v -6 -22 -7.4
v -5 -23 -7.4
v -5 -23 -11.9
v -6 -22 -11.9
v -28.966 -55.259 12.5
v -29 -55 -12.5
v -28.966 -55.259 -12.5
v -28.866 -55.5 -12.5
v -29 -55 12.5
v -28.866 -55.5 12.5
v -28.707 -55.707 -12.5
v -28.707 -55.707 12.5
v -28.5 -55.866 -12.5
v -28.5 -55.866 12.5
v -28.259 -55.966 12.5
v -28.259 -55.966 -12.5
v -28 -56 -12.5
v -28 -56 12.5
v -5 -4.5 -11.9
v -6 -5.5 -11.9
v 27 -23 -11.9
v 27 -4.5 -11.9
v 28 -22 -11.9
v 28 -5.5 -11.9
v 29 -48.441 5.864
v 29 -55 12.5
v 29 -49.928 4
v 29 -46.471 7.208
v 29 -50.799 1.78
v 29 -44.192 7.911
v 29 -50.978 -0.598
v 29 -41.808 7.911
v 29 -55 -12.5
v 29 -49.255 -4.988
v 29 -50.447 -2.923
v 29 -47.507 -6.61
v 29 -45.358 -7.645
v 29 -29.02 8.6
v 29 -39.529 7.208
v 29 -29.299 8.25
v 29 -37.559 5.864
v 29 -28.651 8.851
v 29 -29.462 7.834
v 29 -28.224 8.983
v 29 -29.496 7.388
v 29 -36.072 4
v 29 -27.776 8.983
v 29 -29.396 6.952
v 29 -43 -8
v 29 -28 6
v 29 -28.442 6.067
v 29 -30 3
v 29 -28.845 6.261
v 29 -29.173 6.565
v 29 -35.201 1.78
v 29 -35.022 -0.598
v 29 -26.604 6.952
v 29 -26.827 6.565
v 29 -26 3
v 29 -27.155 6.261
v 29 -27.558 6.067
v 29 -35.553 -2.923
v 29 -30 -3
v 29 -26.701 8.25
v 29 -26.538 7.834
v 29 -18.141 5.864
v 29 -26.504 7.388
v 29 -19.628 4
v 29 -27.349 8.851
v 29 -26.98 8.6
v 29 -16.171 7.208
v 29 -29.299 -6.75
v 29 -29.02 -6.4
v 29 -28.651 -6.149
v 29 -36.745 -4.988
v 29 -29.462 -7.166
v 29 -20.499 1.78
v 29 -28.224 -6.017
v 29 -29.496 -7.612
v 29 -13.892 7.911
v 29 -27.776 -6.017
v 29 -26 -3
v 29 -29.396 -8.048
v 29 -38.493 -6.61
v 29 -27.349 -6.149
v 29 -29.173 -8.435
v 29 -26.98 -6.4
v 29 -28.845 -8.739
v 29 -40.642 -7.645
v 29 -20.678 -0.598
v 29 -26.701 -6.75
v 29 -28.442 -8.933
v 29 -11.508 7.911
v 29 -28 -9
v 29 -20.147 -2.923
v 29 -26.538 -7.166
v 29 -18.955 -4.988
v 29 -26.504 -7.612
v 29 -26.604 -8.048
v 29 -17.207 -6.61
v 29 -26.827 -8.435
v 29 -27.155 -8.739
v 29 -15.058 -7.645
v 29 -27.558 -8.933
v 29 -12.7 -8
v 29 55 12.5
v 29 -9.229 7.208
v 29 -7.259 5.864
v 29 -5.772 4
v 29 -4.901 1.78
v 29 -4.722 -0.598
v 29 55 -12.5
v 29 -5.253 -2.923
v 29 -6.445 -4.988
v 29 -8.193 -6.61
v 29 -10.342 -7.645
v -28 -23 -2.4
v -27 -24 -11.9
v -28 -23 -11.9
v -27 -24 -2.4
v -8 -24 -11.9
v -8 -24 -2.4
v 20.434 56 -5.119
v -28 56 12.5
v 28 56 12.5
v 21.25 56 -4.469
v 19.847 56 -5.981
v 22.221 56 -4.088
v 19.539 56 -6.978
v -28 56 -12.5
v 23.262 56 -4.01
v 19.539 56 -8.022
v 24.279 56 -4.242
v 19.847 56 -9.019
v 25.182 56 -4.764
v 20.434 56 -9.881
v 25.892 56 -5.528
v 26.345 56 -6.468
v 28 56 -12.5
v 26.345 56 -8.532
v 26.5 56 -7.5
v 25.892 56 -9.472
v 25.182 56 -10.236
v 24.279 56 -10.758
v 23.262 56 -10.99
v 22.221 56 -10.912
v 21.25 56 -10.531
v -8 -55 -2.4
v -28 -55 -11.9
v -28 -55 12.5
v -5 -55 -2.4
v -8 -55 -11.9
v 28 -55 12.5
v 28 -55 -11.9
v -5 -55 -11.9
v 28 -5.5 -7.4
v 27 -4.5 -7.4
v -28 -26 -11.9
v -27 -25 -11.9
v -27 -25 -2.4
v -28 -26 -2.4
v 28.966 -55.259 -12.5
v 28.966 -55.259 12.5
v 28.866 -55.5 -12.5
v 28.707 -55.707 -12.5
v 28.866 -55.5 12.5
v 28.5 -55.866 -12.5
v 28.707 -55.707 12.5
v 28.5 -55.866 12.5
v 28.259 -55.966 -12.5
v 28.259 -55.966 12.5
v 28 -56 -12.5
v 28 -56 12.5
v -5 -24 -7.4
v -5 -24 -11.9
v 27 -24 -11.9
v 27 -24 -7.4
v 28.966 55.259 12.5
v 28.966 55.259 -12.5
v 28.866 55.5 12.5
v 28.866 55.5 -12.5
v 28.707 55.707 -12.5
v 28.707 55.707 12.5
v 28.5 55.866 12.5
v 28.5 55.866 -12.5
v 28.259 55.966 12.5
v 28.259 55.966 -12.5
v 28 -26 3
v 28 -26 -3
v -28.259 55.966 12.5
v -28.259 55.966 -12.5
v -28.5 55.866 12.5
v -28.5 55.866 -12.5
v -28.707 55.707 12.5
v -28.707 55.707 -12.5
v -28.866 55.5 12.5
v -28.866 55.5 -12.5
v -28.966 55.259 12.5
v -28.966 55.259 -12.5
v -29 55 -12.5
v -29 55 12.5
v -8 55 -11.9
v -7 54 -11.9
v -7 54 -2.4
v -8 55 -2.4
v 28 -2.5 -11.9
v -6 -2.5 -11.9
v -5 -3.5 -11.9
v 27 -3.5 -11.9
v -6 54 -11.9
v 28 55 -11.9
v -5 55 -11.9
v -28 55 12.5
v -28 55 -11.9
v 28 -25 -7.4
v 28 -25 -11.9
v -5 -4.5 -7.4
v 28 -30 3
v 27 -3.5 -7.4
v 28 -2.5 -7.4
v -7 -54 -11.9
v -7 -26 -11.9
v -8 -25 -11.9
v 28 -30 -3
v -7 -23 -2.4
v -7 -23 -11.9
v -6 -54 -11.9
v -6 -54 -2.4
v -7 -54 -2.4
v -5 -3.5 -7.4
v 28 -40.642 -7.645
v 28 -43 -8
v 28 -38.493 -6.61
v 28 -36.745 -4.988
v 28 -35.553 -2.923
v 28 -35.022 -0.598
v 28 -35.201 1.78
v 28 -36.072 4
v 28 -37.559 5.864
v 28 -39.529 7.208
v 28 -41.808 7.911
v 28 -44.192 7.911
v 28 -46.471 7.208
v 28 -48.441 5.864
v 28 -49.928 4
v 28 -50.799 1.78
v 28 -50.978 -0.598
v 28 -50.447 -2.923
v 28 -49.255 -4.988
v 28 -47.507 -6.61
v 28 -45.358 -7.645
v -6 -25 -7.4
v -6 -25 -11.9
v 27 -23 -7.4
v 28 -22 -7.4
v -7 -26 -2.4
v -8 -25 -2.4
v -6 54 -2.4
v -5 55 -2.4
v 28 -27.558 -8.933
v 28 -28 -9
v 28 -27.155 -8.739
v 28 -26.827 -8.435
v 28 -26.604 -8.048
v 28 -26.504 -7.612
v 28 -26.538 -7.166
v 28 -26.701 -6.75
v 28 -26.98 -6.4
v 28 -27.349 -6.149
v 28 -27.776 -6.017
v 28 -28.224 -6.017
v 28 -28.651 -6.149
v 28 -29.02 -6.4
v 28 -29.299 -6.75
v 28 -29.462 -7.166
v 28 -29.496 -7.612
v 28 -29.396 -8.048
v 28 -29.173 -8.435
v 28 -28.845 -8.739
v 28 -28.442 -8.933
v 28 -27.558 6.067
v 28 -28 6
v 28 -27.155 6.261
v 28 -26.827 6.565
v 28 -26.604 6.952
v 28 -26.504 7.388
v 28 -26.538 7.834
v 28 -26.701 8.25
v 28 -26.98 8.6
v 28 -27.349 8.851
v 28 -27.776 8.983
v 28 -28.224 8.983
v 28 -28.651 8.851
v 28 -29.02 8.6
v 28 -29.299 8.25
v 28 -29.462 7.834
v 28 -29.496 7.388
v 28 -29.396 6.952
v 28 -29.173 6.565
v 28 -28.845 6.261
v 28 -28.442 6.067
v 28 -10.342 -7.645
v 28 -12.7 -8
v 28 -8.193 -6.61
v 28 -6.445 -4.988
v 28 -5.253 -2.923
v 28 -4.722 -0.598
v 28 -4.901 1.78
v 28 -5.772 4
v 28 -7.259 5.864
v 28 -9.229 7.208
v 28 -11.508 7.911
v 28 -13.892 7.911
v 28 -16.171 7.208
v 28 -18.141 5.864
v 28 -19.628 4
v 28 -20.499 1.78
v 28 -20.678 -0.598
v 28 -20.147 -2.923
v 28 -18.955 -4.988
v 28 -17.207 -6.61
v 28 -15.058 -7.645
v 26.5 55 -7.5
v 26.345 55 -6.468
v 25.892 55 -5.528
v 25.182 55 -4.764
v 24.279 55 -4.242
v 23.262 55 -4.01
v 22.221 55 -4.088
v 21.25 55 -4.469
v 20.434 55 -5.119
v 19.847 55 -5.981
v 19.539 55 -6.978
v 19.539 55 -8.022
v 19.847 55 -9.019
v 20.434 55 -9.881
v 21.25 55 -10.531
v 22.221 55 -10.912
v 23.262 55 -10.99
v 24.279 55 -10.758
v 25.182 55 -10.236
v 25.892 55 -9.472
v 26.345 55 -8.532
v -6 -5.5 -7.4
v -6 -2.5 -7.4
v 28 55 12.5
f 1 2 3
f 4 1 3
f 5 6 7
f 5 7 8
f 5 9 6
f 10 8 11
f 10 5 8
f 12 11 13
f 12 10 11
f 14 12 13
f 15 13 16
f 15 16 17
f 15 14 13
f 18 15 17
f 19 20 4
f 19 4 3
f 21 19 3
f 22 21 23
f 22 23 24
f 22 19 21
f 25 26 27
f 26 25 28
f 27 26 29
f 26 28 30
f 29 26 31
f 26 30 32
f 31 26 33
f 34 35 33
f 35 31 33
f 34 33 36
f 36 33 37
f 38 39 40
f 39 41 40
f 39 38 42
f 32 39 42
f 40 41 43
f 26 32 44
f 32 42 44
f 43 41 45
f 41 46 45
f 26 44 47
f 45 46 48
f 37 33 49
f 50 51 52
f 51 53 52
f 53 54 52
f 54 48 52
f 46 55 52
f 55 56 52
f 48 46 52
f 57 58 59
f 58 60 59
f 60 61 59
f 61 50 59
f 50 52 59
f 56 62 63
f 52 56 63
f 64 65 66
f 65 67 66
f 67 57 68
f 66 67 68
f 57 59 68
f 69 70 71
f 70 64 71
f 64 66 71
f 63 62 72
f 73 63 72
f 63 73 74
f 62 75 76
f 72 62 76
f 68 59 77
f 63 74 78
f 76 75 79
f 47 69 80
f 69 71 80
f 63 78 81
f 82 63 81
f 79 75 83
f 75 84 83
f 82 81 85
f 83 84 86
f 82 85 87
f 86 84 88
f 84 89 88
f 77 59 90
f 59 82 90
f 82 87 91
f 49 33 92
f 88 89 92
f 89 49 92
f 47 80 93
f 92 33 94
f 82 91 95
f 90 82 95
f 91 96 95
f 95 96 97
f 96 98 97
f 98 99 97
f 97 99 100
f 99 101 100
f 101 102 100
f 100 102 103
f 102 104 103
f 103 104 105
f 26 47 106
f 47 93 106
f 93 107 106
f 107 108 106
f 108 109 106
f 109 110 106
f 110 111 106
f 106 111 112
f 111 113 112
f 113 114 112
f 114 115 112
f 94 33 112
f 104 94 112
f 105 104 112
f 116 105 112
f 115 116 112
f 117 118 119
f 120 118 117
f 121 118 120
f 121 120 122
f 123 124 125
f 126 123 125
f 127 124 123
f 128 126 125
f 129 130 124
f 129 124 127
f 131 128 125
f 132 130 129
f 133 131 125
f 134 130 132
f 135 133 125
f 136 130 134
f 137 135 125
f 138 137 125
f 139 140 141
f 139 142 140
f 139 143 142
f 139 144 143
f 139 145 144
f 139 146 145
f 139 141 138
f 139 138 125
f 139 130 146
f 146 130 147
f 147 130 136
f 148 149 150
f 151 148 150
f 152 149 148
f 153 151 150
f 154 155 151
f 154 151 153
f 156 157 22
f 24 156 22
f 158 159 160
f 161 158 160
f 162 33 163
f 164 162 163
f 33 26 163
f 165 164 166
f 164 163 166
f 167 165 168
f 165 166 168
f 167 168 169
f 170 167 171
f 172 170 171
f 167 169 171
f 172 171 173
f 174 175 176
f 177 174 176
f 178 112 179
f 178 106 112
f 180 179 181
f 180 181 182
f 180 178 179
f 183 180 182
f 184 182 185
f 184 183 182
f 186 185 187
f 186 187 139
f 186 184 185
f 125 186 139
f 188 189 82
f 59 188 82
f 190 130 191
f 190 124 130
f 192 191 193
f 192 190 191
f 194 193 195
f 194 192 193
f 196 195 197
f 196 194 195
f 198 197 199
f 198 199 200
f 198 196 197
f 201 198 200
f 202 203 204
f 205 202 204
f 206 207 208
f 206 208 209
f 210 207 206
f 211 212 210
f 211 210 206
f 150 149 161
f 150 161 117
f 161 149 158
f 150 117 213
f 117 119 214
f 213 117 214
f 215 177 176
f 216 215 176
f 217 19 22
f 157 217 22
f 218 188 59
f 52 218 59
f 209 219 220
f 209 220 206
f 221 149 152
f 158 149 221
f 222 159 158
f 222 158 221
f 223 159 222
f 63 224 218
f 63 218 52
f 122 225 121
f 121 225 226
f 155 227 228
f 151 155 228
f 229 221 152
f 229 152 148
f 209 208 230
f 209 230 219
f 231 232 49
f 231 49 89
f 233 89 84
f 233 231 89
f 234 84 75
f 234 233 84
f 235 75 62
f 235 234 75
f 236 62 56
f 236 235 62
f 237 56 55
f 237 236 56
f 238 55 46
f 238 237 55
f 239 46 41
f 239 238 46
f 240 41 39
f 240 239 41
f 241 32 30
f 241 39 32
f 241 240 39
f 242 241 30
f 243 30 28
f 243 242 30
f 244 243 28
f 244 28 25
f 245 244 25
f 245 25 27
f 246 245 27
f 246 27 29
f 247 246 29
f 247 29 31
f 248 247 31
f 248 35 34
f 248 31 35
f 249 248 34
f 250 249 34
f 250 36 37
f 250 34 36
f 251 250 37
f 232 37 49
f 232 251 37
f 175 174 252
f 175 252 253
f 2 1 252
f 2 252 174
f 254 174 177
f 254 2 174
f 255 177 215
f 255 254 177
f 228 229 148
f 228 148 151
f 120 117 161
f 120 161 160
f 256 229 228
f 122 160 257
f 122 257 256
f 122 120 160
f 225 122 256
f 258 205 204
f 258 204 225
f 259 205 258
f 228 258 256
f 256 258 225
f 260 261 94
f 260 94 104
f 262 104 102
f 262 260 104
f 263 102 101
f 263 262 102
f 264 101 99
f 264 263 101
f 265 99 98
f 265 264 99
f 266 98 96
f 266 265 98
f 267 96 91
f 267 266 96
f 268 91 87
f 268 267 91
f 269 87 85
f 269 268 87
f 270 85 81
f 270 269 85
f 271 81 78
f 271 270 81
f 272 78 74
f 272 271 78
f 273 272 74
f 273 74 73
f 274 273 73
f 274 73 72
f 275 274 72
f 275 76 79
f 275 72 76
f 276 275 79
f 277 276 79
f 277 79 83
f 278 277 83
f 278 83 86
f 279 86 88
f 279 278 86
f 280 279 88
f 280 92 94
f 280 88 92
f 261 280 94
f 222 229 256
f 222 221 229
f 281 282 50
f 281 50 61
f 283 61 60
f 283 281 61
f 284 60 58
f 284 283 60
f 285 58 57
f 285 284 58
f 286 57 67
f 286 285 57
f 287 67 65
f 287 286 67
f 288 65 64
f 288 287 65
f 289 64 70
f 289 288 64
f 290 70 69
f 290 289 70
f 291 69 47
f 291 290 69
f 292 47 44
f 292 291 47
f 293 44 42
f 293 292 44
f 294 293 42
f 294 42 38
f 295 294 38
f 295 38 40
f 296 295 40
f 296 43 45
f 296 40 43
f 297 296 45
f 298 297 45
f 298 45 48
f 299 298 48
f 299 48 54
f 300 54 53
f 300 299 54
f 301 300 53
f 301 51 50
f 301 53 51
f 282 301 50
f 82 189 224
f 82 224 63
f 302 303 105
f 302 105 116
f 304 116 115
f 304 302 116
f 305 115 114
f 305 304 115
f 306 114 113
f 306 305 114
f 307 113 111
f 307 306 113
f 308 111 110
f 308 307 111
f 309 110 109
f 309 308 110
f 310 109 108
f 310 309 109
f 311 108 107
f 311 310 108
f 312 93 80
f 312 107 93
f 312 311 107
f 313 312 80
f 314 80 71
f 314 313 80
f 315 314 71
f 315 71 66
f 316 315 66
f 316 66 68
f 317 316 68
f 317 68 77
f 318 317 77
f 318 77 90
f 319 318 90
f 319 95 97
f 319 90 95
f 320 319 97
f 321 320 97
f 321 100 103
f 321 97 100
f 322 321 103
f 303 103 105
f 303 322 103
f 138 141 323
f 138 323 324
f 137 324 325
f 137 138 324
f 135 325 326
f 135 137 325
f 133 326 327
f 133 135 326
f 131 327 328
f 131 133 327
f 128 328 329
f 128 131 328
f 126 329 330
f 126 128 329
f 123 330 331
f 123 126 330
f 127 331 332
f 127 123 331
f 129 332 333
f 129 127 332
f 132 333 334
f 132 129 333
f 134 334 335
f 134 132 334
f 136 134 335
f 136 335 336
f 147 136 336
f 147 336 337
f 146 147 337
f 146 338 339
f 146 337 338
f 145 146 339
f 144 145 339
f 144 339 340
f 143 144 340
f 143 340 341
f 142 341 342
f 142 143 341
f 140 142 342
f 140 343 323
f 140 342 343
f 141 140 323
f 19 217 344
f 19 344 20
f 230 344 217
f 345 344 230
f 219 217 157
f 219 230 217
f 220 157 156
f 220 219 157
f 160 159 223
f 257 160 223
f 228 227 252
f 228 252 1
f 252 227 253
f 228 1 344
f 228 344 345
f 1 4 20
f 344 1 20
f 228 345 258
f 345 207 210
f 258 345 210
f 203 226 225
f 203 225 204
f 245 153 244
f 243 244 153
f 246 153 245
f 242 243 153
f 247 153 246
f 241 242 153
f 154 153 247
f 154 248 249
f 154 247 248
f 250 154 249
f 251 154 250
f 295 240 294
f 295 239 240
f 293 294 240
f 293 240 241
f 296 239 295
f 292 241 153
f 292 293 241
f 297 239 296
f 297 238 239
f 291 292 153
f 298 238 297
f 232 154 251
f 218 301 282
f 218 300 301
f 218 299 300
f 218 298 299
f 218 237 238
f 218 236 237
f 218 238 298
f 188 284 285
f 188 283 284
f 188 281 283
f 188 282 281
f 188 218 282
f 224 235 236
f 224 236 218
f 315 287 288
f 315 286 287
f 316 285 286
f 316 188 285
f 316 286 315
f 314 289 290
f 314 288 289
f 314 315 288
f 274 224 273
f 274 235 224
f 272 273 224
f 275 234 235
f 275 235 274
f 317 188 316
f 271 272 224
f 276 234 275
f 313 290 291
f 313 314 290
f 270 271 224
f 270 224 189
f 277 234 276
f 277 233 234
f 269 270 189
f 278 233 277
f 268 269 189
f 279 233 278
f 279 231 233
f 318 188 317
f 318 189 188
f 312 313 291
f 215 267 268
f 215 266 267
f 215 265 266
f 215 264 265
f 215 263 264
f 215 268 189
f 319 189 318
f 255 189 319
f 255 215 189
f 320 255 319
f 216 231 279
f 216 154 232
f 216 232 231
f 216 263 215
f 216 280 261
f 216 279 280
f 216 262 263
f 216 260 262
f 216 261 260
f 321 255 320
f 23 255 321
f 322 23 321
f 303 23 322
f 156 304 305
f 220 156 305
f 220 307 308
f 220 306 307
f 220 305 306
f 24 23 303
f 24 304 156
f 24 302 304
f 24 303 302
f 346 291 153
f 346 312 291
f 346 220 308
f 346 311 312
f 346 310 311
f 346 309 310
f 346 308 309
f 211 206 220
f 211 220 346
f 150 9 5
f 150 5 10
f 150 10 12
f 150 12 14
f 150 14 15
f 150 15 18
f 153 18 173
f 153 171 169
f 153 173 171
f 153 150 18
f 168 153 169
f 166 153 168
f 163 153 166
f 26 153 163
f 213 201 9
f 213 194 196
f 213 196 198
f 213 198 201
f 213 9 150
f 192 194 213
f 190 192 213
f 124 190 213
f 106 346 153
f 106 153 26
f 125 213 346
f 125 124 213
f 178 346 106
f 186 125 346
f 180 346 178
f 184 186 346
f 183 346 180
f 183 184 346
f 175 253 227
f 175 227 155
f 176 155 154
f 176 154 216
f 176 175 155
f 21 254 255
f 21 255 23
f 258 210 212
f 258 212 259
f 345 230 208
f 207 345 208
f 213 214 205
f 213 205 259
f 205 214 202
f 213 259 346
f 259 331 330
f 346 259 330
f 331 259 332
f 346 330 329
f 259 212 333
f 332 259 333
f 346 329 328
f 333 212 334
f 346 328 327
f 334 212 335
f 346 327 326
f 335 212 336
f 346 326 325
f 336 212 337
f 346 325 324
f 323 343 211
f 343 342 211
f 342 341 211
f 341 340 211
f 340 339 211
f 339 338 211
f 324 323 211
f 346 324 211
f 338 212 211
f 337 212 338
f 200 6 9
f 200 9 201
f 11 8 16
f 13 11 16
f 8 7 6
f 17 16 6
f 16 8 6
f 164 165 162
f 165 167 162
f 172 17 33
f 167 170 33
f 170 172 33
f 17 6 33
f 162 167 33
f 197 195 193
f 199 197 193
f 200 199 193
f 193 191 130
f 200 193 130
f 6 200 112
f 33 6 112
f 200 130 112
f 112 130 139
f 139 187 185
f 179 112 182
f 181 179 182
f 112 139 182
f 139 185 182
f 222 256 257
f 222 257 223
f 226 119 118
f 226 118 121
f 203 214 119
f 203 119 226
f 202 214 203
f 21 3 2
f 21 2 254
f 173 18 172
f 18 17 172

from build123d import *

# Parameters (mm, degrees)
CYLINDER005_R           = 1.5
CYLINDER005_DEPTH       = 20
CYLINDER005_PITCH_ANGLE = 90
BOX005_W                = 10
BOX005_H                = 4
BOX005_DEPTH            = 6
CYLINDER002_R           = 8
CYLINDER002_DEPTH       = 6
CYLINDER002_PITCH_ANGLE = 90
CYLINDER001_R           = 8
CYLINDER001_DEPTH       = 6
CYLINDER001_PITCH_ANGLE = 90
CYLINDER_R              = 3.5
CYLINDER_DEPTH          = 50
CYLINDER_ROLL_ANGLE     = 90
CYLINDER006_R           = 1.5
CYLINDER006_DEPTH       = 20
CYLINDER006_PITCH_ANGLE = 90
BOX003_W                = 35.5
BOX003_H                = 1
BOX003_DEPTH            = 5
BOX004_W                = 35.5
BOX004_H                = 1
BOX004_DEPTH            = 5
BOX006_W                = 22
BOX006_H                = 1
BOX006_DEPTH            = 10
BOX002_W                = 1
BOX002_H                = 112
BOX002_DEPTH            = 10
BOX_W                   = 56
BOX_H                   = 110
BOX_DEPTH               = 25
BOX001_W                = 58
BOX001_H                = 112
BOX001_DEPTH            = 25
CHAMFER_SIZE            = 1
FILLET_R                = 1


with BuildPart() as cylinder005:
    # Cylinder005 → Cylinder005 (new body)
    with BuildSketch(Plane.XY):
        Circle(CYLINDER005_R)
    extrude(amount=CYLINDER005_DEPTH)


with BuildPart() as cylinder005_1:
    # Cylinder005 pitch: moved
    add(cylinder005.part.rotate(Axis((0, 0, 0), (0, 1, 0)), CYLINDER005_PITCH_ANGLE))


with BuildPart() as cylinder005_2:
    # Cylinder005 placement: moved
    add(cylinder005_1.part.moved(Location((19.5, -28, -7.5))))


with BuildPart() as interruptor:
    # Box005 → Box005 (new body)
    with BuildSketch(Plane(origin=(24, -30, -3), x_dir=(1, 0, 0), z_dir=(0, 0, 1))):
        with Locations((5, 2)):
            Rectangle(BOX005_W, BOX005_H)
    extrude(amount=BOX005_DEPTH)


with BuildPart() as boton2:
    # Cylinder002 → Cylinder002 (new body)
    with BuildSketch(Plane.XY):
        Circle(CYLINDER002_R)
    extrude(amount=CYLINDER002_DEPTH)


with BuildPart() as boton2_1:
    # Cylinder002 pitch: moved
    add(boton2.part.rotate(Axis((0, 0, 0), (0, 1, 0)), CYLINDER002_PITCH_ANGLE))


with BuildPart() as boton2_2:
    # Cylinder002 placement: moved
    add(boton2_1.part.moved(Location((25.5, -43, 0))))


with BuildPart() as boton1:
    # Cylinder001 → Cylinder001 (new body)
    with BuildSketch(Plane.XY):
        Circle(CYLINDER001_R)
    extrude(amount=CYLINDER001_DEPTH)


with BuildPart() as boton1_1:
    # Cylinder001 pitch: moved
    add(boton1.part.rotate(Axis((0, 0, 0), (0, 1, 0)), CYLINDER001_PITCH_ANGLE))


with BuildPart() as boton1_2:
    # Cylinder001 placement: moved
    add(boton1_1.part.moved(Location((25.5, -12.7, 0))))


with BuildPart() as antenna_hole:
    # Cylinder → Cylinder (new body)
    with BuildSketch(Plane.XY):
        Circle(CYLINDER_R)
    extrude(amount=CYLINDER_DEPTH)


with BuildPart() as antenna_hole_1:
    # Cylinder roll: moved
    add(antenna_hole.part.rotate(Axis((0, 0, 0), (1, 0, 0)), CYLINDER_ROLL_ANGLE))


with BuildPart() as antenna_hole_2:
    # Cylinder placement: moved
    add(antenna_hole_1.part.moved(Location((23, 86.9, -7.5))))


with BuildPart() as cortes:
    # Cylinder006 → Cylinder006 (new body)
    with BuildSketch(Plane.XY):
        Circle(CYLINDER006_R)
    extrude(amount=CYLINDER006_DEPTH)


with BuildPart() as cortes_1:
    # Cylinder006 pitch: moved
    add(cortes.part.rotate(Axis((0, 0, 0), (0, 1, 0)), CYLINDER006_PITCH_ANGLE))


with BuildPart() as cortes_2:
    # Cylinder006 placement: moved
    add(cortes_1.part.moved(Location((19.5, -28, 7.5))))

    # Fusion001: union Cylinder005, interruptor, boton2, boton1, antenna_hole
    add(cylinder005_2.part)
    add(interruptor.part)
    add(boton2_2.part)
    add(boton1_2.part)
    add(antenna_hole_2.part)


with BuildPart() as muro_lora:
    # Box003 → Box003 (new body)
    with BuildSketch(Plane(origin=(-6.7, -4.5, -12.4), x_dir=(1, 0, 0), z_dir=(0, 0, 1))):
        with Locations((17.75, 0.5)):
            Rectangle(BOX003_W, BOX003_H)
    extrude(amount=BOX003_DEPTH)


with BuildPart() as muro_botones:
    # Box004 → Box004 (new body)
    with BuildSketch(Plane(origin=(-6.7, -24, -12.4), x_dir=(1, 0, 0), z_dir=(0, 0, 1))):
        with Locations((17.75, 0.5)):
            Rectangle(BOX004_W, BOX004_H)
    extrude(amount=BOX004_DEPTH)


with BuildPart() as muro_bateria:
    # Box006 → Box006 (new body)
    with BuildSketch(Plane(origin=(-28, -25, -12.4), x_dir=(1, 0, 0), z_dir=(0, 0, 1))):
        with Locations((11, 0.5)):
            Rectangle(BOX006_W, BOX006_H)
    extrude(amount=BOX006_DEPTH)


with BuildPart() as muros:
    # Box002 → Box002 (new body)
    with BuildSketch(Plane(origin=(-7, -56, -12.4), x_dir=(1, 0, 0), z_dir=(0, 0, 1))):
        with Locations((0.5, 56)):
            Rectangle(BOX002_W, BOX002_H)
    extrude(amount=BOX002_DEPTH)

    # Fusion: union muro_lora, muro_botones, muro_bateria
    add(muro_lora.part)
    add(muro_botones.part)
    add(muro_bateria.part)


with BuildPart() as cubo_interior:
    # Box → Box (new body)
    with BuildSketch(Plane(origin=(-28, -55, -11.9), x_dir=(1, 0, 0), z_dir=(0, 0, 1))):
        with Locations((28, 55)):
            Rectangle(BOX_W, BOX_H)
    extrude(amount=BOX_DEPTH)


with BuildPart() as base_caja_lora:
    # Box001 → Box001 (new body)
    with BuildSketch(Plane(origin=(-29, -56, -12.5), x_dir=(1, 0, 0), z_dir=(0, 0, 1))):
        with Locations((29, 56)):
            Rectangle(BOX001_W, BOX001_H)
    extrude(amount=BOX001_DEPTH)

    # Cut: cut Cubo_interior
    add(cubo_interior.part, mode=Mode.SUBTRACT)

    # Fusion002: union muros
    add(muros.part)

    # Cut001: cut cortes
    add(cortes_2.part, mode=Mode.SUBTRACT)

    # Chamfer
    chamfer_edges = [base_caja_lora.edges().sort_by_distance(p)[0] for p in [
        (-7, -55, -7.15),
        (-6, -55, -7.15),
        (28, -24, -9.65),
        (28, -23, -9.65),
        (28, -3.5, -9.65),
        (28, -4.5, -9.65),
        (-6, 55, -7.15),
        (-7, 55, -7.15),
        (-28, -24, -7.15),
        (-28, -25, -7.15),
        (-7, -25, -7.15),
        (-6, -3.5, -9.65),
        (-6, -4.5, -9.65),
        (-6, -23, -9.65),
        (-6, -24, -9.65),
        (-7, -24, -7.15),
    ]]
    chamfer(chamfer_edges, length=CHAMFER_SIZE)

    # Fillet
    fillet_edges = [base_caja_lora.edges().sort_by_distance(p)[0] for p in [
        (-29, -56, 0),
        (-29, 56, 0),
        (29, 56, 0),
        (29, -56, 0),
    ]]
    fillet(fillet_edges, radius=FILLET_R)


solid = base_caja_lora.part
